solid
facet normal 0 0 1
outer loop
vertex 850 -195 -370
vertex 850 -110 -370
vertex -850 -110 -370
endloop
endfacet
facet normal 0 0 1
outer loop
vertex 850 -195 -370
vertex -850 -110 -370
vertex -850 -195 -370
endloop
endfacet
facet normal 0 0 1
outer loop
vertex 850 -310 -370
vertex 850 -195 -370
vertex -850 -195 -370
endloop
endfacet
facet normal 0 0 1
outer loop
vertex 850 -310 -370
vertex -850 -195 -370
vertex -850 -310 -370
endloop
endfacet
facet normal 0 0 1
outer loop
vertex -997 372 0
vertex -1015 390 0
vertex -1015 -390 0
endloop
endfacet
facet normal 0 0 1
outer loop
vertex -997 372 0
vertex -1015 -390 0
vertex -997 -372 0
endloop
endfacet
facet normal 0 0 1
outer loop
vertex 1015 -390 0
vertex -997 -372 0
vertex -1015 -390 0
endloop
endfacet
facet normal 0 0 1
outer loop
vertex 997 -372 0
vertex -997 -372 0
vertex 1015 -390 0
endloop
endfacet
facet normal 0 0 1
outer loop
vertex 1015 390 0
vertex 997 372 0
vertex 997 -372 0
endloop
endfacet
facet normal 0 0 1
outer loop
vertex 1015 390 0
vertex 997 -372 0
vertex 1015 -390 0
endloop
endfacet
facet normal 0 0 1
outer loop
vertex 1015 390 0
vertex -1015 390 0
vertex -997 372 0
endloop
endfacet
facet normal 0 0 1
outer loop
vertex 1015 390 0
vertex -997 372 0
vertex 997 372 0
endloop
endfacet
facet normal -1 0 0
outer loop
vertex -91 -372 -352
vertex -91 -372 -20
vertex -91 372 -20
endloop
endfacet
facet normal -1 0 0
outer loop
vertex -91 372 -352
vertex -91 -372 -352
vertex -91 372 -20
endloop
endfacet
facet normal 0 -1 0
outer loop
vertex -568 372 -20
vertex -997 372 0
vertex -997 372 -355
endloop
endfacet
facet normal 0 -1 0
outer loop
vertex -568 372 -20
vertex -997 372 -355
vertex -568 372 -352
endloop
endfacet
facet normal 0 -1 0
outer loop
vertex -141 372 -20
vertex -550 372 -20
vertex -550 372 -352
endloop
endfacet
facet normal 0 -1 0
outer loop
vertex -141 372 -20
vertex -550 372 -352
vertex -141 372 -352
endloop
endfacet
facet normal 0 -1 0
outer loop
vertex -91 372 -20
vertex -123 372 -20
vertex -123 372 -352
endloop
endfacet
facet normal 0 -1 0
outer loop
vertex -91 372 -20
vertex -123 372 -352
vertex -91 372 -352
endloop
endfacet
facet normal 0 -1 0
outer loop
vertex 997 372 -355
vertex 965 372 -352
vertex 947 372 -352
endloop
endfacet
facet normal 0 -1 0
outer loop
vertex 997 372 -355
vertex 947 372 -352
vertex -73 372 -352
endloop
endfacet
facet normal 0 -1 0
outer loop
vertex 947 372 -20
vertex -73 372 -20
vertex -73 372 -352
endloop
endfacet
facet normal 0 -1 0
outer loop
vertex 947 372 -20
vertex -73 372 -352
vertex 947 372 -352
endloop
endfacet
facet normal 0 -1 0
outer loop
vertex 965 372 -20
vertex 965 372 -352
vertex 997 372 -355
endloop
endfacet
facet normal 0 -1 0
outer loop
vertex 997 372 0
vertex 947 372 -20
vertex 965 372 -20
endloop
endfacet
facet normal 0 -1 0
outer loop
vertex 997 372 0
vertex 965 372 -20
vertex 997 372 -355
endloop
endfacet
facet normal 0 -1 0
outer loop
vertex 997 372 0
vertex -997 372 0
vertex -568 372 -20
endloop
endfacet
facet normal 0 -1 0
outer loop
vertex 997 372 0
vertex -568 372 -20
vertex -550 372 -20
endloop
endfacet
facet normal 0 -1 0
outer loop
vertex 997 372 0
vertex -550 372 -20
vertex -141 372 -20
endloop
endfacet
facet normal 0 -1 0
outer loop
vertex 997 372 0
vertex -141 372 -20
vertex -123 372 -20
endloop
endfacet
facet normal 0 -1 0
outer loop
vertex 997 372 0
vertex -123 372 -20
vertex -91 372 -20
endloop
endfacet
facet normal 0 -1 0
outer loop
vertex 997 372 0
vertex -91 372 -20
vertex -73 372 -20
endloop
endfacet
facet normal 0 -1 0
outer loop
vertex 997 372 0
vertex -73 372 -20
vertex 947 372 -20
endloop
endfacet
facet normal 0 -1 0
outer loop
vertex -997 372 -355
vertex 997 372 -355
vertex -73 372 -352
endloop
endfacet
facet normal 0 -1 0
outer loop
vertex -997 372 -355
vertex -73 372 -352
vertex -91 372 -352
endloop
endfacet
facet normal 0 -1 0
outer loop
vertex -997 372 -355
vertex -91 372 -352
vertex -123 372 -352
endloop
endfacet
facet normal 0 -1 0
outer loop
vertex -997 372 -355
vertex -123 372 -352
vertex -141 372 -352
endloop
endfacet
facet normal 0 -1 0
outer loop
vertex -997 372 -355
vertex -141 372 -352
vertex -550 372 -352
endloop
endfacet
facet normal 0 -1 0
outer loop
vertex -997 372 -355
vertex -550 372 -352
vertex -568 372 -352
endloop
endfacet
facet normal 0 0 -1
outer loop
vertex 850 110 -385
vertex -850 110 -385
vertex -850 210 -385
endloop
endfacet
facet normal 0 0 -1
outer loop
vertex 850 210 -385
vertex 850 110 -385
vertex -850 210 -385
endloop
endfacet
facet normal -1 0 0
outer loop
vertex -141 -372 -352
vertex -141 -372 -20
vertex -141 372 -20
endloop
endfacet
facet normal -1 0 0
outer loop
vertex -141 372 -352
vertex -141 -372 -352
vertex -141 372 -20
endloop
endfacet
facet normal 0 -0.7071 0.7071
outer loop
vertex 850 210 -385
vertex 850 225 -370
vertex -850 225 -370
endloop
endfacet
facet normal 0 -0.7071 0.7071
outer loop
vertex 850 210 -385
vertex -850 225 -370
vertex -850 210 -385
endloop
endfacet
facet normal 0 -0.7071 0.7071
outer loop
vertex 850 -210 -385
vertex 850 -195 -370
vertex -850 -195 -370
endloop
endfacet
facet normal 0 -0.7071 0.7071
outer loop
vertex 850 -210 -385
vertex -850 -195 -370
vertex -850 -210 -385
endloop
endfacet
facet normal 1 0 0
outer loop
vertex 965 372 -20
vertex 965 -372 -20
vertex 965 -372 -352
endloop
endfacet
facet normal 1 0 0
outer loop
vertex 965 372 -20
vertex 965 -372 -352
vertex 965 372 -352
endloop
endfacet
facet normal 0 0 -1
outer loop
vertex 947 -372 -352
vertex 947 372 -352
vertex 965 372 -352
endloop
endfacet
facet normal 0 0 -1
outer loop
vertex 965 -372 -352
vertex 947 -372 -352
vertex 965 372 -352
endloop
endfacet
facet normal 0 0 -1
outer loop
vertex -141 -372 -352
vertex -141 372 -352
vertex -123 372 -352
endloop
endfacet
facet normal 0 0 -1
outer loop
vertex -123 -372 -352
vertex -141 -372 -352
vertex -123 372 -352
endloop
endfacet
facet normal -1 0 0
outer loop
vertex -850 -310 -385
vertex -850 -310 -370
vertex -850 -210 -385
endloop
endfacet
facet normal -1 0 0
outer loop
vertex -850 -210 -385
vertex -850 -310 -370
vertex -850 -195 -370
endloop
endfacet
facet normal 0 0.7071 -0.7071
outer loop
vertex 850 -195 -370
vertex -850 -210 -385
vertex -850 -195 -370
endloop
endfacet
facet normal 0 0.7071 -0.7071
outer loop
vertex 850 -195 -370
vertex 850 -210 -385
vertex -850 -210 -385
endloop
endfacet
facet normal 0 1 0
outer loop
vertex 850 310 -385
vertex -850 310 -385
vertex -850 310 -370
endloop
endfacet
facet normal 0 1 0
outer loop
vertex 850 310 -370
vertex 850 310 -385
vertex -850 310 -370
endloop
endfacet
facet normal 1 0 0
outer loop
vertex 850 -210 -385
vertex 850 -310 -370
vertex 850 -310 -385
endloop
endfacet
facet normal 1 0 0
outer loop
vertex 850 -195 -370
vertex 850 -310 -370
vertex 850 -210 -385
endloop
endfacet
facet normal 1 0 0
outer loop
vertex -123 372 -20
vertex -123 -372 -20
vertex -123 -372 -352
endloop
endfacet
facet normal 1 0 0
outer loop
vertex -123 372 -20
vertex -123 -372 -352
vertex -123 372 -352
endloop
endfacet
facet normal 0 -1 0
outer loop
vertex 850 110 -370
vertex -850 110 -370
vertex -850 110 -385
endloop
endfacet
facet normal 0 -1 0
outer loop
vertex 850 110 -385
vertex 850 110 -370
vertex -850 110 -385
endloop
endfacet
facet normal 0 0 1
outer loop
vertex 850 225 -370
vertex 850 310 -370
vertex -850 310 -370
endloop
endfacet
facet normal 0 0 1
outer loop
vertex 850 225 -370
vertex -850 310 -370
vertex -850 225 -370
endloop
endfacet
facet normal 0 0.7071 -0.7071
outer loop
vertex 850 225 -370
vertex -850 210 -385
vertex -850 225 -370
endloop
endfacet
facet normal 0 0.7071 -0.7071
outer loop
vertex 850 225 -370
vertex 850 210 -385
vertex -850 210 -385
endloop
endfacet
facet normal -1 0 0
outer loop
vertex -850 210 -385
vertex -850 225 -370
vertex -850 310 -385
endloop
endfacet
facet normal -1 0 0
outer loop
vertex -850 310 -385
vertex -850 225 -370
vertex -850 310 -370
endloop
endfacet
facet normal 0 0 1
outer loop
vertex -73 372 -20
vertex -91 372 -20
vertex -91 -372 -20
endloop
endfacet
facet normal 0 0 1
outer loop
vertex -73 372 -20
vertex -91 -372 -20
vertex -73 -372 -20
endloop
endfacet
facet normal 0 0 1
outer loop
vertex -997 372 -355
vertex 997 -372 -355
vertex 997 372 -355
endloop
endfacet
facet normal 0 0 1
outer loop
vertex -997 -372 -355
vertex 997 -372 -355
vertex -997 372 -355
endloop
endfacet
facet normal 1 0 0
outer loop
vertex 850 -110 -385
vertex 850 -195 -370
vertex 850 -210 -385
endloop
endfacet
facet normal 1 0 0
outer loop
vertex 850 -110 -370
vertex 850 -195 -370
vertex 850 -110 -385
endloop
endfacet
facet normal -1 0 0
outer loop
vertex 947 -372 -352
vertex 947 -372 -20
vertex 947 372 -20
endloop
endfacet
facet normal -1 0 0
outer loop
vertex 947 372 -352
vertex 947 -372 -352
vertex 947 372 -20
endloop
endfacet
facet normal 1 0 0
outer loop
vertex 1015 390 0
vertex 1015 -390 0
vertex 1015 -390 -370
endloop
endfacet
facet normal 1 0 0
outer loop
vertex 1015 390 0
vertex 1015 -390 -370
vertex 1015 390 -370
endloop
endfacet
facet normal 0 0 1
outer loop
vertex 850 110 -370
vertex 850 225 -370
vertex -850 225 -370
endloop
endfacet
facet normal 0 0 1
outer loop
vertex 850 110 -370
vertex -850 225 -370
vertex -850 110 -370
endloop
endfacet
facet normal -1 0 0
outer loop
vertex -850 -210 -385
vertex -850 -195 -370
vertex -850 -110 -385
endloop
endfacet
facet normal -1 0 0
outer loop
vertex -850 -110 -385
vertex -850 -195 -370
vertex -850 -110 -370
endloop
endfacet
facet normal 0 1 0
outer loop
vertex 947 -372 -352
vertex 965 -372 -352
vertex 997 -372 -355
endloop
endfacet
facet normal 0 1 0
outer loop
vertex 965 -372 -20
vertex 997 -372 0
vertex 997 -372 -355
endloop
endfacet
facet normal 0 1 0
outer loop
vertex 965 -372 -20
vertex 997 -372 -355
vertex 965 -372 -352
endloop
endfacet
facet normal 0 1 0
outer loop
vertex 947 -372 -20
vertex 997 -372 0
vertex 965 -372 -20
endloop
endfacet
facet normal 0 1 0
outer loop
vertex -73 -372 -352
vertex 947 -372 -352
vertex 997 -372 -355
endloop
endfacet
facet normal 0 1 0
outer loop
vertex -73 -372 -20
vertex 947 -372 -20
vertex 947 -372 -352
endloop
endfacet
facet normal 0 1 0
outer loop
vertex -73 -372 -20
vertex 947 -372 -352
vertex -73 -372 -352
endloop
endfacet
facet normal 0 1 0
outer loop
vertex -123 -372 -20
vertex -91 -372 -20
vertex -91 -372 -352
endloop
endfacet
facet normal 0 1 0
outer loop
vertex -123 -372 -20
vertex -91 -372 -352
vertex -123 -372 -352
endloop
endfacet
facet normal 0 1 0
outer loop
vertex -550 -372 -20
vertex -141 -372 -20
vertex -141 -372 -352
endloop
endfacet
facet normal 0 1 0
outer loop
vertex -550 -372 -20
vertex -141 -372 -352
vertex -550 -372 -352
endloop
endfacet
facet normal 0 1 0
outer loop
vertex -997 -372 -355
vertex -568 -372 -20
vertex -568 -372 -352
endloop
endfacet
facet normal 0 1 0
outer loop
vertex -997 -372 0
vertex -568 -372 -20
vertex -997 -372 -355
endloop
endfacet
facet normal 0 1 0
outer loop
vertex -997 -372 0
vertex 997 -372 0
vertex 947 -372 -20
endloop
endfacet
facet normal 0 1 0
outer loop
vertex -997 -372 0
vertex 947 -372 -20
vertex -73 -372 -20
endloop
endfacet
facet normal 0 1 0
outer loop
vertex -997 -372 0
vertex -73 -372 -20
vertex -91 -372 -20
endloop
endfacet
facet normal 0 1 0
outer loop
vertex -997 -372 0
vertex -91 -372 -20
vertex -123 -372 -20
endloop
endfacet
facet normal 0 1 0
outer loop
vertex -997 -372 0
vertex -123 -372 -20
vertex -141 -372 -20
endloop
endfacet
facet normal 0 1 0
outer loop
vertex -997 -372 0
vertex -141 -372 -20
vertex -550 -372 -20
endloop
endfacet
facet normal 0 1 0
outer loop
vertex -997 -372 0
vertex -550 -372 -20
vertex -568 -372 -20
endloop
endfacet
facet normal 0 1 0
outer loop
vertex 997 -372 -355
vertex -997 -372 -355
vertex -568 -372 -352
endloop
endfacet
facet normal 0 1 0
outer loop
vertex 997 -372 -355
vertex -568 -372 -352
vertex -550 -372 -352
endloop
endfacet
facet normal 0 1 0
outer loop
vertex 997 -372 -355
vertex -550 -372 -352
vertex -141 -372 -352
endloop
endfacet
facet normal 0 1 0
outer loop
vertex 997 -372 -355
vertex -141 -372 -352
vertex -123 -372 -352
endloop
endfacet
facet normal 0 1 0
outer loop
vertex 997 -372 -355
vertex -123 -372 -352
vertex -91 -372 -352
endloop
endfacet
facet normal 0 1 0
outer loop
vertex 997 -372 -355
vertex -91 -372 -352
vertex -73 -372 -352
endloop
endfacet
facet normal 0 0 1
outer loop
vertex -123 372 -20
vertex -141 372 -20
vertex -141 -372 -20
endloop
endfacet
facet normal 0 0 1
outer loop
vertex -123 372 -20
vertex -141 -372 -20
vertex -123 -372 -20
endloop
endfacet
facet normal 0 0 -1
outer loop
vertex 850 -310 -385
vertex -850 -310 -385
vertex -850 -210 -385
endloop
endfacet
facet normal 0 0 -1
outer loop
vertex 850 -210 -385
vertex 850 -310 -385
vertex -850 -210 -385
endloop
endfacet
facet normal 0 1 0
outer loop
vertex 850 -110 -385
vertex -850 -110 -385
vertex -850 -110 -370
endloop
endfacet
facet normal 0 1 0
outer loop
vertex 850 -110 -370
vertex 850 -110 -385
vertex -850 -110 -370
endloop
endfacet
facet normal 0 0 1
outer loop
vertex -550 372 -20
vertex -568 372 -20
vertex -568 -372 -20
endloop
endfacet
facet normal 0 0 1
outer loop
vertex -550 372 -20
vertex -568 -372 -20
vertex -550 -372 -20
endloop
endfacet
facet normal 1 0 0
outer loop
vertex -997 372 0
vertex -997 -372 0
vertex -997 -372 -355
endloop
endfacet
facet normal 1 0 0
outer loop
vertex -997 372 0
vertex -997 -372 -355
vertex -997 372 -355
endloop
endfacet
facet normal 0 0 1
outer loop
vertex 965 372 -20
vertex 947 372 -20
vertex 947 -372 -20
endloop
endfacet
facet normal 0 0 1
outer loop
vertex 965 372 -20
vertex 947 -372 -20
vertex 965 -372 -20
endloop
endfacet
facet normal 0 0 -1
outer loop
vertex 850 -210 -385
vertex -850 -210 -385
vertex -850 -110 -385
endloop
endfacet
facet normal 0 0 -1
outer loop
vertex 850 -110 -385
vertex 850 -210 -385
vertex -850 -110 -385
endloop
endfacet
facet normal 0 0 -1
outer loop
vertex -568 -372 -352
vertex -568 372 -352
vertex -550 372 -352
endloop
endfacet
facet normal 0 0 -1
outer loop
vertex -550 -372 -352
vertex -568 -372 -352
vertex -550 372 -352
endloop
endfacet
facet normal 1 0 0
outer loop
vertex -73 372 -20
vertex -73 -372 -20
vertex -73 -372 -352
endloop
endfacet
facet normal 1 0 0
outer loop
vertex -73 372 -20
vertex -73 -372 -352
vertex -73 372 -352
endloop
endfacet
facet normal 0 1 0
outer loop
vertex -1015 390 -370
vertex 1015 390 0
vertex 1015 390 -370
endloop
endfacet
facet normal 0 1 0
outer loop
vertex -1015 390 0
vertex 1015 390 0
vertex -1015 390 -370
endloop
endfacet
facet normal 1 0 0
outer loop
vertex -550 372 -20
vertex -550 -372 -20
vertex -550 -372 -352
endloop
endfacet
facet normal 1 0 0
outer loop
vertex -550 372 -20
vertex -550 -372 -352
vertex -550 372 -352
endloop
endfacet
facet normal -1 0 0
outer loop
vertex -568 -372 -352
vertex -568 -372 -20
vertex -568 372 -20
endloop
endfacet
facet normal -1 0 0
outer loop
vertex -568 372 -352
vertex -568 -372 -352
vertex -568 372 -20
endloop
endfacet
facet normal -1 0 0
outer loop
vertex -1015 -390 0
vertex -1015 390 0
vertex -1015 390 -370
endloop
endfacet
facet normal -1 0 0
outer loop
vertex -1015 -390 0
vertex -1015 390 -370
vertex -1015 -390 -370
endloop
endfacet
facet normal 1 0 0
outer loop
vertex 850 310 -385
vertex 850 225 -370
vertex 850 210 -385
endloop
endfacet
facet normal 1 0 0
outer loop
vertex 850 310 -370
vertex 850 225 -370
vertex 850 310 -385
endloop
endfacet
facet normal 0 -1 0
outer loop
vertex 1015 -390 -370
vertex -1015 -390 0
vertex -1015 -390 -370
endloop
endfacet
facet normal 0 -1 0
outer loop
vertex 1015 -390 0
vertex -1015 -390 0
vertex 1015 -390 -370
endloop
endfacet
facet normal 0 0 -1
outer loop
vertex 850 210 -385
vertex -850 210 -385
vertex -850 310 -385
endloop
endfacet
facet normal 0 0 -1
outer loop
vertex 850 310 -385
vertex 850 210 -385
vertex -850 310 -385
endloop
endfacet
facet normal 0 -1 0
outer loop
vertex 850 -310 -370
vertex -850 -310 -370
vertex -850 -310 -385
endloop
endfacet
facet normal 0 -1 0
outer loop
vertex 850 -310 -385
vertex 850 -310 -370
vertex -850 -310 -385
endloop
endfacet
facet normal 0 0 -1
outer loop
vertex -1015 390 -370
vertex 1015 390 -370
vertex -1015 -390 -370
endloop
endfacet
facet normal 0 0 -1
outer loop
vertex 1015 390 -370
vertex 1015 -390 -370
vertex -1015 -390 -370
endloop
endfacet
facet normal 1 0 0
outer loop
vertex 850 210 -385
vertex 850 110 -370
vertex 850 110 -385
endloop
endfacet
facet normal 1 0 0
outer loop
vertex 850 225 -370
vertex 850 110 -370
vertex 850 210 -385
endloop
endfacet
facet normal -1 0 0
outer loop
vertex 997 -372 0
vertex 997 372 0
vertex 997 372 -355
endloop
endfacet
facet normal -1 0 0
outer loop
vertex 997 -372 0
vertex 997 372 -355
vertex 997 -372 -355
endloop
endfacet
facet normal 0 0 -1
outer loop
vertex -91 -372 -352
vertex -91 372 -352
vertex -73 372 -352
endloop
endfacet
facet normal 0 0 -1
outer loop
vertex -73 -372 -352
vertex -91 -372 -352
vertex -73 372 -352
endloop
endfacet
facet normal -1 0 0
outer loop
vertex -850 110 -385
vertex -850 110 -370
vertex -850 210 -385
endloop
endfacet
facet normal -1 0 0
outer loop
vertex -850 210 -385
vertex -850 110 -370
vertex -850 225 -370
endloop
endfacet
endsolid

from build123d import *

# Parameters (mm, degrees)
F6_W           = 18
F6_H           = 744
F13_DEPTH      = 332
F14_DEPTH      = 370
F15_DEPTH      = 370
F8_W           = 1994
F8_H           = 15
F16_DEPTH      = 744
F17_DEPTH      = 850
F17_DEPTH_BACK = 850
F18_DEPTH      = 850
F18_DEPTH_BACK = 850


with BuildPart() as f13:
    # F6 (on offset) → F13 (new body)
    with BuildSketch(Plane.XY.offset(-20)):
        with Locations((956, 0)):
            Rectangle(F6_W, F6_H)
    extrude(amount=-F13_DEPTH)



with BuildPart() as f13b:
    # F6 (on offset) → F13, piece 2 (new body)
    with BuildSketch(Plane.XY.offset(-20)):
        with Locations((-82, 0)):
            Rectangle(F6_W, F6_H)
    extrude(amount=-F13_DEPTH)


with BuildPart() as f13c:
    # F6 (on offset) → F13, piece 3 (new body)
    with BuildSketch(Plane.XY.offset(-20)):
        with Locations((-132, 0)):
            Rectangle(F6_W, F6_H)
    extrude(amount=-F13_DEPTH)


with BuildPart() as f13d:
    # F6 (on offset) → F13, piece 4 (new body)
    with BuildSketch(Plane.XY.offset(-20)):
        with Locations((-559, 0)):
            Rectangle(F6_W, F6_H)
    extrude(amount=-F13_DEPTH)


with BuildPart() as f14:
    # F2 (on Top) → F14 (new body)
    with BuildSketch(Plane.XY):
        Polygon((-997, 372), (-1015, 390), (-1015, -390), (-997, -372), align=None)
    extrude(amount=-F14_DEPTH)


with BuildPart() as f14b:
    # F2 (on Top) → F14, piece 2 (new body)
    with BuildSketch(Plane.XY):
        Polygon((1015, -390), (1015, 390), (997, 372), (997, -372), align=None)
    extrude(amount=-F14_DEPTH)


with BuildPart() as f13_1:
    add(f13.part)

    add(f13b.part)  # F15 merges F13b

    add(f13c.part)  # F15 merges F13c

    add(f13d.part)  # F15 merges F13d

    add(f14.part)  # F15 merges F14

    add(f14b.part)  # F15 merges F14b
    # F2 (on Top) → F15 (join)
    with BuildSketch(Plane.XY):
        Polygon((1015, 390), (-1015, 390), (-997, 372), (-568, 372), (-550, 372), (-141, 372), (-123, 372), (-91, 372), (-73, 372), (947, 372), (965, 372), (997, 372), align=None)
        Polygon((-997, -372), (-1015, -390), (1015, -390), (997, -372), (965, -372), (947, -372), (-73, -372), (-91, -372), (-123, -372), (-141, -372), (-550, -372), (-568, -372), align=None)
    extrude(amount=-F15_DEPTH)

    # F8 (on offset) → F16 (join)
    with BuildSketch(Plane(origin=(0, -372, 0), x_dir=(-1, 0, 0), z_dir=(0, 1, 0))):
        with Locations((0, -362.5)):
            Rectangle(F8_W, F8_H)
    extrude(amount=F16_DEPTH)


with BuildPart() as f17:
    # F12 (on line) → F17 (new body, two sides)
    with BuildSketch(Plane.YZ) as f17_sk:
        Polygon((310, -385), (310, -370), (225, -370), (210, -385), align=None)
    extrude(amount=F17_DEPTH)
    extrude(f17_sk.sketch, amount=-F17_DEPTH_BACK)


with BuildPart() as f17b:
    # F12 (on line) → F17, piece 2 (new body, two sides)
    with BuildSketch(Plane.YZ) as f17_2_sk:
        Polygon((-110, -385), (-110, -370), (-195, -370), (-210, -385), align=None)
    extrude(amount=F17_DEPTH)
    extrude(f17_2_sk.sketch, amount=-F17_DEPTH_BACK)


with BuildPart() as f18:
    # F12 (on line) → F18 (new body, two sides)
    with BuildSketch(Plane.YZ) as f18_sk:
        Polygon((-210, -385), (-195, -370), (-310, -370), (-310, -385), align=None)
    extrude(amount=F18_DEPTH)
    extrude(f18_sk.sketch, amount=-F18_DEPTH_BACK)


with BuildPart() as f18b:
    # F12 (on line) → F18, piece 2 (new body, two sides)
    with BuildSketch(Plane.YZ) as f18_2_sk:
        Polygon((210, -385), (225, -370), (110, -370), (110, -385), align=None)
    extrude(amount=F18_DEPTH)
    extrude(f18_2_sk.sketch, amount=-F18_DEPTH_BACK)


solid = Compound([f13_1.part, f17.part, f17b.part, f18.part, f18b.part])
